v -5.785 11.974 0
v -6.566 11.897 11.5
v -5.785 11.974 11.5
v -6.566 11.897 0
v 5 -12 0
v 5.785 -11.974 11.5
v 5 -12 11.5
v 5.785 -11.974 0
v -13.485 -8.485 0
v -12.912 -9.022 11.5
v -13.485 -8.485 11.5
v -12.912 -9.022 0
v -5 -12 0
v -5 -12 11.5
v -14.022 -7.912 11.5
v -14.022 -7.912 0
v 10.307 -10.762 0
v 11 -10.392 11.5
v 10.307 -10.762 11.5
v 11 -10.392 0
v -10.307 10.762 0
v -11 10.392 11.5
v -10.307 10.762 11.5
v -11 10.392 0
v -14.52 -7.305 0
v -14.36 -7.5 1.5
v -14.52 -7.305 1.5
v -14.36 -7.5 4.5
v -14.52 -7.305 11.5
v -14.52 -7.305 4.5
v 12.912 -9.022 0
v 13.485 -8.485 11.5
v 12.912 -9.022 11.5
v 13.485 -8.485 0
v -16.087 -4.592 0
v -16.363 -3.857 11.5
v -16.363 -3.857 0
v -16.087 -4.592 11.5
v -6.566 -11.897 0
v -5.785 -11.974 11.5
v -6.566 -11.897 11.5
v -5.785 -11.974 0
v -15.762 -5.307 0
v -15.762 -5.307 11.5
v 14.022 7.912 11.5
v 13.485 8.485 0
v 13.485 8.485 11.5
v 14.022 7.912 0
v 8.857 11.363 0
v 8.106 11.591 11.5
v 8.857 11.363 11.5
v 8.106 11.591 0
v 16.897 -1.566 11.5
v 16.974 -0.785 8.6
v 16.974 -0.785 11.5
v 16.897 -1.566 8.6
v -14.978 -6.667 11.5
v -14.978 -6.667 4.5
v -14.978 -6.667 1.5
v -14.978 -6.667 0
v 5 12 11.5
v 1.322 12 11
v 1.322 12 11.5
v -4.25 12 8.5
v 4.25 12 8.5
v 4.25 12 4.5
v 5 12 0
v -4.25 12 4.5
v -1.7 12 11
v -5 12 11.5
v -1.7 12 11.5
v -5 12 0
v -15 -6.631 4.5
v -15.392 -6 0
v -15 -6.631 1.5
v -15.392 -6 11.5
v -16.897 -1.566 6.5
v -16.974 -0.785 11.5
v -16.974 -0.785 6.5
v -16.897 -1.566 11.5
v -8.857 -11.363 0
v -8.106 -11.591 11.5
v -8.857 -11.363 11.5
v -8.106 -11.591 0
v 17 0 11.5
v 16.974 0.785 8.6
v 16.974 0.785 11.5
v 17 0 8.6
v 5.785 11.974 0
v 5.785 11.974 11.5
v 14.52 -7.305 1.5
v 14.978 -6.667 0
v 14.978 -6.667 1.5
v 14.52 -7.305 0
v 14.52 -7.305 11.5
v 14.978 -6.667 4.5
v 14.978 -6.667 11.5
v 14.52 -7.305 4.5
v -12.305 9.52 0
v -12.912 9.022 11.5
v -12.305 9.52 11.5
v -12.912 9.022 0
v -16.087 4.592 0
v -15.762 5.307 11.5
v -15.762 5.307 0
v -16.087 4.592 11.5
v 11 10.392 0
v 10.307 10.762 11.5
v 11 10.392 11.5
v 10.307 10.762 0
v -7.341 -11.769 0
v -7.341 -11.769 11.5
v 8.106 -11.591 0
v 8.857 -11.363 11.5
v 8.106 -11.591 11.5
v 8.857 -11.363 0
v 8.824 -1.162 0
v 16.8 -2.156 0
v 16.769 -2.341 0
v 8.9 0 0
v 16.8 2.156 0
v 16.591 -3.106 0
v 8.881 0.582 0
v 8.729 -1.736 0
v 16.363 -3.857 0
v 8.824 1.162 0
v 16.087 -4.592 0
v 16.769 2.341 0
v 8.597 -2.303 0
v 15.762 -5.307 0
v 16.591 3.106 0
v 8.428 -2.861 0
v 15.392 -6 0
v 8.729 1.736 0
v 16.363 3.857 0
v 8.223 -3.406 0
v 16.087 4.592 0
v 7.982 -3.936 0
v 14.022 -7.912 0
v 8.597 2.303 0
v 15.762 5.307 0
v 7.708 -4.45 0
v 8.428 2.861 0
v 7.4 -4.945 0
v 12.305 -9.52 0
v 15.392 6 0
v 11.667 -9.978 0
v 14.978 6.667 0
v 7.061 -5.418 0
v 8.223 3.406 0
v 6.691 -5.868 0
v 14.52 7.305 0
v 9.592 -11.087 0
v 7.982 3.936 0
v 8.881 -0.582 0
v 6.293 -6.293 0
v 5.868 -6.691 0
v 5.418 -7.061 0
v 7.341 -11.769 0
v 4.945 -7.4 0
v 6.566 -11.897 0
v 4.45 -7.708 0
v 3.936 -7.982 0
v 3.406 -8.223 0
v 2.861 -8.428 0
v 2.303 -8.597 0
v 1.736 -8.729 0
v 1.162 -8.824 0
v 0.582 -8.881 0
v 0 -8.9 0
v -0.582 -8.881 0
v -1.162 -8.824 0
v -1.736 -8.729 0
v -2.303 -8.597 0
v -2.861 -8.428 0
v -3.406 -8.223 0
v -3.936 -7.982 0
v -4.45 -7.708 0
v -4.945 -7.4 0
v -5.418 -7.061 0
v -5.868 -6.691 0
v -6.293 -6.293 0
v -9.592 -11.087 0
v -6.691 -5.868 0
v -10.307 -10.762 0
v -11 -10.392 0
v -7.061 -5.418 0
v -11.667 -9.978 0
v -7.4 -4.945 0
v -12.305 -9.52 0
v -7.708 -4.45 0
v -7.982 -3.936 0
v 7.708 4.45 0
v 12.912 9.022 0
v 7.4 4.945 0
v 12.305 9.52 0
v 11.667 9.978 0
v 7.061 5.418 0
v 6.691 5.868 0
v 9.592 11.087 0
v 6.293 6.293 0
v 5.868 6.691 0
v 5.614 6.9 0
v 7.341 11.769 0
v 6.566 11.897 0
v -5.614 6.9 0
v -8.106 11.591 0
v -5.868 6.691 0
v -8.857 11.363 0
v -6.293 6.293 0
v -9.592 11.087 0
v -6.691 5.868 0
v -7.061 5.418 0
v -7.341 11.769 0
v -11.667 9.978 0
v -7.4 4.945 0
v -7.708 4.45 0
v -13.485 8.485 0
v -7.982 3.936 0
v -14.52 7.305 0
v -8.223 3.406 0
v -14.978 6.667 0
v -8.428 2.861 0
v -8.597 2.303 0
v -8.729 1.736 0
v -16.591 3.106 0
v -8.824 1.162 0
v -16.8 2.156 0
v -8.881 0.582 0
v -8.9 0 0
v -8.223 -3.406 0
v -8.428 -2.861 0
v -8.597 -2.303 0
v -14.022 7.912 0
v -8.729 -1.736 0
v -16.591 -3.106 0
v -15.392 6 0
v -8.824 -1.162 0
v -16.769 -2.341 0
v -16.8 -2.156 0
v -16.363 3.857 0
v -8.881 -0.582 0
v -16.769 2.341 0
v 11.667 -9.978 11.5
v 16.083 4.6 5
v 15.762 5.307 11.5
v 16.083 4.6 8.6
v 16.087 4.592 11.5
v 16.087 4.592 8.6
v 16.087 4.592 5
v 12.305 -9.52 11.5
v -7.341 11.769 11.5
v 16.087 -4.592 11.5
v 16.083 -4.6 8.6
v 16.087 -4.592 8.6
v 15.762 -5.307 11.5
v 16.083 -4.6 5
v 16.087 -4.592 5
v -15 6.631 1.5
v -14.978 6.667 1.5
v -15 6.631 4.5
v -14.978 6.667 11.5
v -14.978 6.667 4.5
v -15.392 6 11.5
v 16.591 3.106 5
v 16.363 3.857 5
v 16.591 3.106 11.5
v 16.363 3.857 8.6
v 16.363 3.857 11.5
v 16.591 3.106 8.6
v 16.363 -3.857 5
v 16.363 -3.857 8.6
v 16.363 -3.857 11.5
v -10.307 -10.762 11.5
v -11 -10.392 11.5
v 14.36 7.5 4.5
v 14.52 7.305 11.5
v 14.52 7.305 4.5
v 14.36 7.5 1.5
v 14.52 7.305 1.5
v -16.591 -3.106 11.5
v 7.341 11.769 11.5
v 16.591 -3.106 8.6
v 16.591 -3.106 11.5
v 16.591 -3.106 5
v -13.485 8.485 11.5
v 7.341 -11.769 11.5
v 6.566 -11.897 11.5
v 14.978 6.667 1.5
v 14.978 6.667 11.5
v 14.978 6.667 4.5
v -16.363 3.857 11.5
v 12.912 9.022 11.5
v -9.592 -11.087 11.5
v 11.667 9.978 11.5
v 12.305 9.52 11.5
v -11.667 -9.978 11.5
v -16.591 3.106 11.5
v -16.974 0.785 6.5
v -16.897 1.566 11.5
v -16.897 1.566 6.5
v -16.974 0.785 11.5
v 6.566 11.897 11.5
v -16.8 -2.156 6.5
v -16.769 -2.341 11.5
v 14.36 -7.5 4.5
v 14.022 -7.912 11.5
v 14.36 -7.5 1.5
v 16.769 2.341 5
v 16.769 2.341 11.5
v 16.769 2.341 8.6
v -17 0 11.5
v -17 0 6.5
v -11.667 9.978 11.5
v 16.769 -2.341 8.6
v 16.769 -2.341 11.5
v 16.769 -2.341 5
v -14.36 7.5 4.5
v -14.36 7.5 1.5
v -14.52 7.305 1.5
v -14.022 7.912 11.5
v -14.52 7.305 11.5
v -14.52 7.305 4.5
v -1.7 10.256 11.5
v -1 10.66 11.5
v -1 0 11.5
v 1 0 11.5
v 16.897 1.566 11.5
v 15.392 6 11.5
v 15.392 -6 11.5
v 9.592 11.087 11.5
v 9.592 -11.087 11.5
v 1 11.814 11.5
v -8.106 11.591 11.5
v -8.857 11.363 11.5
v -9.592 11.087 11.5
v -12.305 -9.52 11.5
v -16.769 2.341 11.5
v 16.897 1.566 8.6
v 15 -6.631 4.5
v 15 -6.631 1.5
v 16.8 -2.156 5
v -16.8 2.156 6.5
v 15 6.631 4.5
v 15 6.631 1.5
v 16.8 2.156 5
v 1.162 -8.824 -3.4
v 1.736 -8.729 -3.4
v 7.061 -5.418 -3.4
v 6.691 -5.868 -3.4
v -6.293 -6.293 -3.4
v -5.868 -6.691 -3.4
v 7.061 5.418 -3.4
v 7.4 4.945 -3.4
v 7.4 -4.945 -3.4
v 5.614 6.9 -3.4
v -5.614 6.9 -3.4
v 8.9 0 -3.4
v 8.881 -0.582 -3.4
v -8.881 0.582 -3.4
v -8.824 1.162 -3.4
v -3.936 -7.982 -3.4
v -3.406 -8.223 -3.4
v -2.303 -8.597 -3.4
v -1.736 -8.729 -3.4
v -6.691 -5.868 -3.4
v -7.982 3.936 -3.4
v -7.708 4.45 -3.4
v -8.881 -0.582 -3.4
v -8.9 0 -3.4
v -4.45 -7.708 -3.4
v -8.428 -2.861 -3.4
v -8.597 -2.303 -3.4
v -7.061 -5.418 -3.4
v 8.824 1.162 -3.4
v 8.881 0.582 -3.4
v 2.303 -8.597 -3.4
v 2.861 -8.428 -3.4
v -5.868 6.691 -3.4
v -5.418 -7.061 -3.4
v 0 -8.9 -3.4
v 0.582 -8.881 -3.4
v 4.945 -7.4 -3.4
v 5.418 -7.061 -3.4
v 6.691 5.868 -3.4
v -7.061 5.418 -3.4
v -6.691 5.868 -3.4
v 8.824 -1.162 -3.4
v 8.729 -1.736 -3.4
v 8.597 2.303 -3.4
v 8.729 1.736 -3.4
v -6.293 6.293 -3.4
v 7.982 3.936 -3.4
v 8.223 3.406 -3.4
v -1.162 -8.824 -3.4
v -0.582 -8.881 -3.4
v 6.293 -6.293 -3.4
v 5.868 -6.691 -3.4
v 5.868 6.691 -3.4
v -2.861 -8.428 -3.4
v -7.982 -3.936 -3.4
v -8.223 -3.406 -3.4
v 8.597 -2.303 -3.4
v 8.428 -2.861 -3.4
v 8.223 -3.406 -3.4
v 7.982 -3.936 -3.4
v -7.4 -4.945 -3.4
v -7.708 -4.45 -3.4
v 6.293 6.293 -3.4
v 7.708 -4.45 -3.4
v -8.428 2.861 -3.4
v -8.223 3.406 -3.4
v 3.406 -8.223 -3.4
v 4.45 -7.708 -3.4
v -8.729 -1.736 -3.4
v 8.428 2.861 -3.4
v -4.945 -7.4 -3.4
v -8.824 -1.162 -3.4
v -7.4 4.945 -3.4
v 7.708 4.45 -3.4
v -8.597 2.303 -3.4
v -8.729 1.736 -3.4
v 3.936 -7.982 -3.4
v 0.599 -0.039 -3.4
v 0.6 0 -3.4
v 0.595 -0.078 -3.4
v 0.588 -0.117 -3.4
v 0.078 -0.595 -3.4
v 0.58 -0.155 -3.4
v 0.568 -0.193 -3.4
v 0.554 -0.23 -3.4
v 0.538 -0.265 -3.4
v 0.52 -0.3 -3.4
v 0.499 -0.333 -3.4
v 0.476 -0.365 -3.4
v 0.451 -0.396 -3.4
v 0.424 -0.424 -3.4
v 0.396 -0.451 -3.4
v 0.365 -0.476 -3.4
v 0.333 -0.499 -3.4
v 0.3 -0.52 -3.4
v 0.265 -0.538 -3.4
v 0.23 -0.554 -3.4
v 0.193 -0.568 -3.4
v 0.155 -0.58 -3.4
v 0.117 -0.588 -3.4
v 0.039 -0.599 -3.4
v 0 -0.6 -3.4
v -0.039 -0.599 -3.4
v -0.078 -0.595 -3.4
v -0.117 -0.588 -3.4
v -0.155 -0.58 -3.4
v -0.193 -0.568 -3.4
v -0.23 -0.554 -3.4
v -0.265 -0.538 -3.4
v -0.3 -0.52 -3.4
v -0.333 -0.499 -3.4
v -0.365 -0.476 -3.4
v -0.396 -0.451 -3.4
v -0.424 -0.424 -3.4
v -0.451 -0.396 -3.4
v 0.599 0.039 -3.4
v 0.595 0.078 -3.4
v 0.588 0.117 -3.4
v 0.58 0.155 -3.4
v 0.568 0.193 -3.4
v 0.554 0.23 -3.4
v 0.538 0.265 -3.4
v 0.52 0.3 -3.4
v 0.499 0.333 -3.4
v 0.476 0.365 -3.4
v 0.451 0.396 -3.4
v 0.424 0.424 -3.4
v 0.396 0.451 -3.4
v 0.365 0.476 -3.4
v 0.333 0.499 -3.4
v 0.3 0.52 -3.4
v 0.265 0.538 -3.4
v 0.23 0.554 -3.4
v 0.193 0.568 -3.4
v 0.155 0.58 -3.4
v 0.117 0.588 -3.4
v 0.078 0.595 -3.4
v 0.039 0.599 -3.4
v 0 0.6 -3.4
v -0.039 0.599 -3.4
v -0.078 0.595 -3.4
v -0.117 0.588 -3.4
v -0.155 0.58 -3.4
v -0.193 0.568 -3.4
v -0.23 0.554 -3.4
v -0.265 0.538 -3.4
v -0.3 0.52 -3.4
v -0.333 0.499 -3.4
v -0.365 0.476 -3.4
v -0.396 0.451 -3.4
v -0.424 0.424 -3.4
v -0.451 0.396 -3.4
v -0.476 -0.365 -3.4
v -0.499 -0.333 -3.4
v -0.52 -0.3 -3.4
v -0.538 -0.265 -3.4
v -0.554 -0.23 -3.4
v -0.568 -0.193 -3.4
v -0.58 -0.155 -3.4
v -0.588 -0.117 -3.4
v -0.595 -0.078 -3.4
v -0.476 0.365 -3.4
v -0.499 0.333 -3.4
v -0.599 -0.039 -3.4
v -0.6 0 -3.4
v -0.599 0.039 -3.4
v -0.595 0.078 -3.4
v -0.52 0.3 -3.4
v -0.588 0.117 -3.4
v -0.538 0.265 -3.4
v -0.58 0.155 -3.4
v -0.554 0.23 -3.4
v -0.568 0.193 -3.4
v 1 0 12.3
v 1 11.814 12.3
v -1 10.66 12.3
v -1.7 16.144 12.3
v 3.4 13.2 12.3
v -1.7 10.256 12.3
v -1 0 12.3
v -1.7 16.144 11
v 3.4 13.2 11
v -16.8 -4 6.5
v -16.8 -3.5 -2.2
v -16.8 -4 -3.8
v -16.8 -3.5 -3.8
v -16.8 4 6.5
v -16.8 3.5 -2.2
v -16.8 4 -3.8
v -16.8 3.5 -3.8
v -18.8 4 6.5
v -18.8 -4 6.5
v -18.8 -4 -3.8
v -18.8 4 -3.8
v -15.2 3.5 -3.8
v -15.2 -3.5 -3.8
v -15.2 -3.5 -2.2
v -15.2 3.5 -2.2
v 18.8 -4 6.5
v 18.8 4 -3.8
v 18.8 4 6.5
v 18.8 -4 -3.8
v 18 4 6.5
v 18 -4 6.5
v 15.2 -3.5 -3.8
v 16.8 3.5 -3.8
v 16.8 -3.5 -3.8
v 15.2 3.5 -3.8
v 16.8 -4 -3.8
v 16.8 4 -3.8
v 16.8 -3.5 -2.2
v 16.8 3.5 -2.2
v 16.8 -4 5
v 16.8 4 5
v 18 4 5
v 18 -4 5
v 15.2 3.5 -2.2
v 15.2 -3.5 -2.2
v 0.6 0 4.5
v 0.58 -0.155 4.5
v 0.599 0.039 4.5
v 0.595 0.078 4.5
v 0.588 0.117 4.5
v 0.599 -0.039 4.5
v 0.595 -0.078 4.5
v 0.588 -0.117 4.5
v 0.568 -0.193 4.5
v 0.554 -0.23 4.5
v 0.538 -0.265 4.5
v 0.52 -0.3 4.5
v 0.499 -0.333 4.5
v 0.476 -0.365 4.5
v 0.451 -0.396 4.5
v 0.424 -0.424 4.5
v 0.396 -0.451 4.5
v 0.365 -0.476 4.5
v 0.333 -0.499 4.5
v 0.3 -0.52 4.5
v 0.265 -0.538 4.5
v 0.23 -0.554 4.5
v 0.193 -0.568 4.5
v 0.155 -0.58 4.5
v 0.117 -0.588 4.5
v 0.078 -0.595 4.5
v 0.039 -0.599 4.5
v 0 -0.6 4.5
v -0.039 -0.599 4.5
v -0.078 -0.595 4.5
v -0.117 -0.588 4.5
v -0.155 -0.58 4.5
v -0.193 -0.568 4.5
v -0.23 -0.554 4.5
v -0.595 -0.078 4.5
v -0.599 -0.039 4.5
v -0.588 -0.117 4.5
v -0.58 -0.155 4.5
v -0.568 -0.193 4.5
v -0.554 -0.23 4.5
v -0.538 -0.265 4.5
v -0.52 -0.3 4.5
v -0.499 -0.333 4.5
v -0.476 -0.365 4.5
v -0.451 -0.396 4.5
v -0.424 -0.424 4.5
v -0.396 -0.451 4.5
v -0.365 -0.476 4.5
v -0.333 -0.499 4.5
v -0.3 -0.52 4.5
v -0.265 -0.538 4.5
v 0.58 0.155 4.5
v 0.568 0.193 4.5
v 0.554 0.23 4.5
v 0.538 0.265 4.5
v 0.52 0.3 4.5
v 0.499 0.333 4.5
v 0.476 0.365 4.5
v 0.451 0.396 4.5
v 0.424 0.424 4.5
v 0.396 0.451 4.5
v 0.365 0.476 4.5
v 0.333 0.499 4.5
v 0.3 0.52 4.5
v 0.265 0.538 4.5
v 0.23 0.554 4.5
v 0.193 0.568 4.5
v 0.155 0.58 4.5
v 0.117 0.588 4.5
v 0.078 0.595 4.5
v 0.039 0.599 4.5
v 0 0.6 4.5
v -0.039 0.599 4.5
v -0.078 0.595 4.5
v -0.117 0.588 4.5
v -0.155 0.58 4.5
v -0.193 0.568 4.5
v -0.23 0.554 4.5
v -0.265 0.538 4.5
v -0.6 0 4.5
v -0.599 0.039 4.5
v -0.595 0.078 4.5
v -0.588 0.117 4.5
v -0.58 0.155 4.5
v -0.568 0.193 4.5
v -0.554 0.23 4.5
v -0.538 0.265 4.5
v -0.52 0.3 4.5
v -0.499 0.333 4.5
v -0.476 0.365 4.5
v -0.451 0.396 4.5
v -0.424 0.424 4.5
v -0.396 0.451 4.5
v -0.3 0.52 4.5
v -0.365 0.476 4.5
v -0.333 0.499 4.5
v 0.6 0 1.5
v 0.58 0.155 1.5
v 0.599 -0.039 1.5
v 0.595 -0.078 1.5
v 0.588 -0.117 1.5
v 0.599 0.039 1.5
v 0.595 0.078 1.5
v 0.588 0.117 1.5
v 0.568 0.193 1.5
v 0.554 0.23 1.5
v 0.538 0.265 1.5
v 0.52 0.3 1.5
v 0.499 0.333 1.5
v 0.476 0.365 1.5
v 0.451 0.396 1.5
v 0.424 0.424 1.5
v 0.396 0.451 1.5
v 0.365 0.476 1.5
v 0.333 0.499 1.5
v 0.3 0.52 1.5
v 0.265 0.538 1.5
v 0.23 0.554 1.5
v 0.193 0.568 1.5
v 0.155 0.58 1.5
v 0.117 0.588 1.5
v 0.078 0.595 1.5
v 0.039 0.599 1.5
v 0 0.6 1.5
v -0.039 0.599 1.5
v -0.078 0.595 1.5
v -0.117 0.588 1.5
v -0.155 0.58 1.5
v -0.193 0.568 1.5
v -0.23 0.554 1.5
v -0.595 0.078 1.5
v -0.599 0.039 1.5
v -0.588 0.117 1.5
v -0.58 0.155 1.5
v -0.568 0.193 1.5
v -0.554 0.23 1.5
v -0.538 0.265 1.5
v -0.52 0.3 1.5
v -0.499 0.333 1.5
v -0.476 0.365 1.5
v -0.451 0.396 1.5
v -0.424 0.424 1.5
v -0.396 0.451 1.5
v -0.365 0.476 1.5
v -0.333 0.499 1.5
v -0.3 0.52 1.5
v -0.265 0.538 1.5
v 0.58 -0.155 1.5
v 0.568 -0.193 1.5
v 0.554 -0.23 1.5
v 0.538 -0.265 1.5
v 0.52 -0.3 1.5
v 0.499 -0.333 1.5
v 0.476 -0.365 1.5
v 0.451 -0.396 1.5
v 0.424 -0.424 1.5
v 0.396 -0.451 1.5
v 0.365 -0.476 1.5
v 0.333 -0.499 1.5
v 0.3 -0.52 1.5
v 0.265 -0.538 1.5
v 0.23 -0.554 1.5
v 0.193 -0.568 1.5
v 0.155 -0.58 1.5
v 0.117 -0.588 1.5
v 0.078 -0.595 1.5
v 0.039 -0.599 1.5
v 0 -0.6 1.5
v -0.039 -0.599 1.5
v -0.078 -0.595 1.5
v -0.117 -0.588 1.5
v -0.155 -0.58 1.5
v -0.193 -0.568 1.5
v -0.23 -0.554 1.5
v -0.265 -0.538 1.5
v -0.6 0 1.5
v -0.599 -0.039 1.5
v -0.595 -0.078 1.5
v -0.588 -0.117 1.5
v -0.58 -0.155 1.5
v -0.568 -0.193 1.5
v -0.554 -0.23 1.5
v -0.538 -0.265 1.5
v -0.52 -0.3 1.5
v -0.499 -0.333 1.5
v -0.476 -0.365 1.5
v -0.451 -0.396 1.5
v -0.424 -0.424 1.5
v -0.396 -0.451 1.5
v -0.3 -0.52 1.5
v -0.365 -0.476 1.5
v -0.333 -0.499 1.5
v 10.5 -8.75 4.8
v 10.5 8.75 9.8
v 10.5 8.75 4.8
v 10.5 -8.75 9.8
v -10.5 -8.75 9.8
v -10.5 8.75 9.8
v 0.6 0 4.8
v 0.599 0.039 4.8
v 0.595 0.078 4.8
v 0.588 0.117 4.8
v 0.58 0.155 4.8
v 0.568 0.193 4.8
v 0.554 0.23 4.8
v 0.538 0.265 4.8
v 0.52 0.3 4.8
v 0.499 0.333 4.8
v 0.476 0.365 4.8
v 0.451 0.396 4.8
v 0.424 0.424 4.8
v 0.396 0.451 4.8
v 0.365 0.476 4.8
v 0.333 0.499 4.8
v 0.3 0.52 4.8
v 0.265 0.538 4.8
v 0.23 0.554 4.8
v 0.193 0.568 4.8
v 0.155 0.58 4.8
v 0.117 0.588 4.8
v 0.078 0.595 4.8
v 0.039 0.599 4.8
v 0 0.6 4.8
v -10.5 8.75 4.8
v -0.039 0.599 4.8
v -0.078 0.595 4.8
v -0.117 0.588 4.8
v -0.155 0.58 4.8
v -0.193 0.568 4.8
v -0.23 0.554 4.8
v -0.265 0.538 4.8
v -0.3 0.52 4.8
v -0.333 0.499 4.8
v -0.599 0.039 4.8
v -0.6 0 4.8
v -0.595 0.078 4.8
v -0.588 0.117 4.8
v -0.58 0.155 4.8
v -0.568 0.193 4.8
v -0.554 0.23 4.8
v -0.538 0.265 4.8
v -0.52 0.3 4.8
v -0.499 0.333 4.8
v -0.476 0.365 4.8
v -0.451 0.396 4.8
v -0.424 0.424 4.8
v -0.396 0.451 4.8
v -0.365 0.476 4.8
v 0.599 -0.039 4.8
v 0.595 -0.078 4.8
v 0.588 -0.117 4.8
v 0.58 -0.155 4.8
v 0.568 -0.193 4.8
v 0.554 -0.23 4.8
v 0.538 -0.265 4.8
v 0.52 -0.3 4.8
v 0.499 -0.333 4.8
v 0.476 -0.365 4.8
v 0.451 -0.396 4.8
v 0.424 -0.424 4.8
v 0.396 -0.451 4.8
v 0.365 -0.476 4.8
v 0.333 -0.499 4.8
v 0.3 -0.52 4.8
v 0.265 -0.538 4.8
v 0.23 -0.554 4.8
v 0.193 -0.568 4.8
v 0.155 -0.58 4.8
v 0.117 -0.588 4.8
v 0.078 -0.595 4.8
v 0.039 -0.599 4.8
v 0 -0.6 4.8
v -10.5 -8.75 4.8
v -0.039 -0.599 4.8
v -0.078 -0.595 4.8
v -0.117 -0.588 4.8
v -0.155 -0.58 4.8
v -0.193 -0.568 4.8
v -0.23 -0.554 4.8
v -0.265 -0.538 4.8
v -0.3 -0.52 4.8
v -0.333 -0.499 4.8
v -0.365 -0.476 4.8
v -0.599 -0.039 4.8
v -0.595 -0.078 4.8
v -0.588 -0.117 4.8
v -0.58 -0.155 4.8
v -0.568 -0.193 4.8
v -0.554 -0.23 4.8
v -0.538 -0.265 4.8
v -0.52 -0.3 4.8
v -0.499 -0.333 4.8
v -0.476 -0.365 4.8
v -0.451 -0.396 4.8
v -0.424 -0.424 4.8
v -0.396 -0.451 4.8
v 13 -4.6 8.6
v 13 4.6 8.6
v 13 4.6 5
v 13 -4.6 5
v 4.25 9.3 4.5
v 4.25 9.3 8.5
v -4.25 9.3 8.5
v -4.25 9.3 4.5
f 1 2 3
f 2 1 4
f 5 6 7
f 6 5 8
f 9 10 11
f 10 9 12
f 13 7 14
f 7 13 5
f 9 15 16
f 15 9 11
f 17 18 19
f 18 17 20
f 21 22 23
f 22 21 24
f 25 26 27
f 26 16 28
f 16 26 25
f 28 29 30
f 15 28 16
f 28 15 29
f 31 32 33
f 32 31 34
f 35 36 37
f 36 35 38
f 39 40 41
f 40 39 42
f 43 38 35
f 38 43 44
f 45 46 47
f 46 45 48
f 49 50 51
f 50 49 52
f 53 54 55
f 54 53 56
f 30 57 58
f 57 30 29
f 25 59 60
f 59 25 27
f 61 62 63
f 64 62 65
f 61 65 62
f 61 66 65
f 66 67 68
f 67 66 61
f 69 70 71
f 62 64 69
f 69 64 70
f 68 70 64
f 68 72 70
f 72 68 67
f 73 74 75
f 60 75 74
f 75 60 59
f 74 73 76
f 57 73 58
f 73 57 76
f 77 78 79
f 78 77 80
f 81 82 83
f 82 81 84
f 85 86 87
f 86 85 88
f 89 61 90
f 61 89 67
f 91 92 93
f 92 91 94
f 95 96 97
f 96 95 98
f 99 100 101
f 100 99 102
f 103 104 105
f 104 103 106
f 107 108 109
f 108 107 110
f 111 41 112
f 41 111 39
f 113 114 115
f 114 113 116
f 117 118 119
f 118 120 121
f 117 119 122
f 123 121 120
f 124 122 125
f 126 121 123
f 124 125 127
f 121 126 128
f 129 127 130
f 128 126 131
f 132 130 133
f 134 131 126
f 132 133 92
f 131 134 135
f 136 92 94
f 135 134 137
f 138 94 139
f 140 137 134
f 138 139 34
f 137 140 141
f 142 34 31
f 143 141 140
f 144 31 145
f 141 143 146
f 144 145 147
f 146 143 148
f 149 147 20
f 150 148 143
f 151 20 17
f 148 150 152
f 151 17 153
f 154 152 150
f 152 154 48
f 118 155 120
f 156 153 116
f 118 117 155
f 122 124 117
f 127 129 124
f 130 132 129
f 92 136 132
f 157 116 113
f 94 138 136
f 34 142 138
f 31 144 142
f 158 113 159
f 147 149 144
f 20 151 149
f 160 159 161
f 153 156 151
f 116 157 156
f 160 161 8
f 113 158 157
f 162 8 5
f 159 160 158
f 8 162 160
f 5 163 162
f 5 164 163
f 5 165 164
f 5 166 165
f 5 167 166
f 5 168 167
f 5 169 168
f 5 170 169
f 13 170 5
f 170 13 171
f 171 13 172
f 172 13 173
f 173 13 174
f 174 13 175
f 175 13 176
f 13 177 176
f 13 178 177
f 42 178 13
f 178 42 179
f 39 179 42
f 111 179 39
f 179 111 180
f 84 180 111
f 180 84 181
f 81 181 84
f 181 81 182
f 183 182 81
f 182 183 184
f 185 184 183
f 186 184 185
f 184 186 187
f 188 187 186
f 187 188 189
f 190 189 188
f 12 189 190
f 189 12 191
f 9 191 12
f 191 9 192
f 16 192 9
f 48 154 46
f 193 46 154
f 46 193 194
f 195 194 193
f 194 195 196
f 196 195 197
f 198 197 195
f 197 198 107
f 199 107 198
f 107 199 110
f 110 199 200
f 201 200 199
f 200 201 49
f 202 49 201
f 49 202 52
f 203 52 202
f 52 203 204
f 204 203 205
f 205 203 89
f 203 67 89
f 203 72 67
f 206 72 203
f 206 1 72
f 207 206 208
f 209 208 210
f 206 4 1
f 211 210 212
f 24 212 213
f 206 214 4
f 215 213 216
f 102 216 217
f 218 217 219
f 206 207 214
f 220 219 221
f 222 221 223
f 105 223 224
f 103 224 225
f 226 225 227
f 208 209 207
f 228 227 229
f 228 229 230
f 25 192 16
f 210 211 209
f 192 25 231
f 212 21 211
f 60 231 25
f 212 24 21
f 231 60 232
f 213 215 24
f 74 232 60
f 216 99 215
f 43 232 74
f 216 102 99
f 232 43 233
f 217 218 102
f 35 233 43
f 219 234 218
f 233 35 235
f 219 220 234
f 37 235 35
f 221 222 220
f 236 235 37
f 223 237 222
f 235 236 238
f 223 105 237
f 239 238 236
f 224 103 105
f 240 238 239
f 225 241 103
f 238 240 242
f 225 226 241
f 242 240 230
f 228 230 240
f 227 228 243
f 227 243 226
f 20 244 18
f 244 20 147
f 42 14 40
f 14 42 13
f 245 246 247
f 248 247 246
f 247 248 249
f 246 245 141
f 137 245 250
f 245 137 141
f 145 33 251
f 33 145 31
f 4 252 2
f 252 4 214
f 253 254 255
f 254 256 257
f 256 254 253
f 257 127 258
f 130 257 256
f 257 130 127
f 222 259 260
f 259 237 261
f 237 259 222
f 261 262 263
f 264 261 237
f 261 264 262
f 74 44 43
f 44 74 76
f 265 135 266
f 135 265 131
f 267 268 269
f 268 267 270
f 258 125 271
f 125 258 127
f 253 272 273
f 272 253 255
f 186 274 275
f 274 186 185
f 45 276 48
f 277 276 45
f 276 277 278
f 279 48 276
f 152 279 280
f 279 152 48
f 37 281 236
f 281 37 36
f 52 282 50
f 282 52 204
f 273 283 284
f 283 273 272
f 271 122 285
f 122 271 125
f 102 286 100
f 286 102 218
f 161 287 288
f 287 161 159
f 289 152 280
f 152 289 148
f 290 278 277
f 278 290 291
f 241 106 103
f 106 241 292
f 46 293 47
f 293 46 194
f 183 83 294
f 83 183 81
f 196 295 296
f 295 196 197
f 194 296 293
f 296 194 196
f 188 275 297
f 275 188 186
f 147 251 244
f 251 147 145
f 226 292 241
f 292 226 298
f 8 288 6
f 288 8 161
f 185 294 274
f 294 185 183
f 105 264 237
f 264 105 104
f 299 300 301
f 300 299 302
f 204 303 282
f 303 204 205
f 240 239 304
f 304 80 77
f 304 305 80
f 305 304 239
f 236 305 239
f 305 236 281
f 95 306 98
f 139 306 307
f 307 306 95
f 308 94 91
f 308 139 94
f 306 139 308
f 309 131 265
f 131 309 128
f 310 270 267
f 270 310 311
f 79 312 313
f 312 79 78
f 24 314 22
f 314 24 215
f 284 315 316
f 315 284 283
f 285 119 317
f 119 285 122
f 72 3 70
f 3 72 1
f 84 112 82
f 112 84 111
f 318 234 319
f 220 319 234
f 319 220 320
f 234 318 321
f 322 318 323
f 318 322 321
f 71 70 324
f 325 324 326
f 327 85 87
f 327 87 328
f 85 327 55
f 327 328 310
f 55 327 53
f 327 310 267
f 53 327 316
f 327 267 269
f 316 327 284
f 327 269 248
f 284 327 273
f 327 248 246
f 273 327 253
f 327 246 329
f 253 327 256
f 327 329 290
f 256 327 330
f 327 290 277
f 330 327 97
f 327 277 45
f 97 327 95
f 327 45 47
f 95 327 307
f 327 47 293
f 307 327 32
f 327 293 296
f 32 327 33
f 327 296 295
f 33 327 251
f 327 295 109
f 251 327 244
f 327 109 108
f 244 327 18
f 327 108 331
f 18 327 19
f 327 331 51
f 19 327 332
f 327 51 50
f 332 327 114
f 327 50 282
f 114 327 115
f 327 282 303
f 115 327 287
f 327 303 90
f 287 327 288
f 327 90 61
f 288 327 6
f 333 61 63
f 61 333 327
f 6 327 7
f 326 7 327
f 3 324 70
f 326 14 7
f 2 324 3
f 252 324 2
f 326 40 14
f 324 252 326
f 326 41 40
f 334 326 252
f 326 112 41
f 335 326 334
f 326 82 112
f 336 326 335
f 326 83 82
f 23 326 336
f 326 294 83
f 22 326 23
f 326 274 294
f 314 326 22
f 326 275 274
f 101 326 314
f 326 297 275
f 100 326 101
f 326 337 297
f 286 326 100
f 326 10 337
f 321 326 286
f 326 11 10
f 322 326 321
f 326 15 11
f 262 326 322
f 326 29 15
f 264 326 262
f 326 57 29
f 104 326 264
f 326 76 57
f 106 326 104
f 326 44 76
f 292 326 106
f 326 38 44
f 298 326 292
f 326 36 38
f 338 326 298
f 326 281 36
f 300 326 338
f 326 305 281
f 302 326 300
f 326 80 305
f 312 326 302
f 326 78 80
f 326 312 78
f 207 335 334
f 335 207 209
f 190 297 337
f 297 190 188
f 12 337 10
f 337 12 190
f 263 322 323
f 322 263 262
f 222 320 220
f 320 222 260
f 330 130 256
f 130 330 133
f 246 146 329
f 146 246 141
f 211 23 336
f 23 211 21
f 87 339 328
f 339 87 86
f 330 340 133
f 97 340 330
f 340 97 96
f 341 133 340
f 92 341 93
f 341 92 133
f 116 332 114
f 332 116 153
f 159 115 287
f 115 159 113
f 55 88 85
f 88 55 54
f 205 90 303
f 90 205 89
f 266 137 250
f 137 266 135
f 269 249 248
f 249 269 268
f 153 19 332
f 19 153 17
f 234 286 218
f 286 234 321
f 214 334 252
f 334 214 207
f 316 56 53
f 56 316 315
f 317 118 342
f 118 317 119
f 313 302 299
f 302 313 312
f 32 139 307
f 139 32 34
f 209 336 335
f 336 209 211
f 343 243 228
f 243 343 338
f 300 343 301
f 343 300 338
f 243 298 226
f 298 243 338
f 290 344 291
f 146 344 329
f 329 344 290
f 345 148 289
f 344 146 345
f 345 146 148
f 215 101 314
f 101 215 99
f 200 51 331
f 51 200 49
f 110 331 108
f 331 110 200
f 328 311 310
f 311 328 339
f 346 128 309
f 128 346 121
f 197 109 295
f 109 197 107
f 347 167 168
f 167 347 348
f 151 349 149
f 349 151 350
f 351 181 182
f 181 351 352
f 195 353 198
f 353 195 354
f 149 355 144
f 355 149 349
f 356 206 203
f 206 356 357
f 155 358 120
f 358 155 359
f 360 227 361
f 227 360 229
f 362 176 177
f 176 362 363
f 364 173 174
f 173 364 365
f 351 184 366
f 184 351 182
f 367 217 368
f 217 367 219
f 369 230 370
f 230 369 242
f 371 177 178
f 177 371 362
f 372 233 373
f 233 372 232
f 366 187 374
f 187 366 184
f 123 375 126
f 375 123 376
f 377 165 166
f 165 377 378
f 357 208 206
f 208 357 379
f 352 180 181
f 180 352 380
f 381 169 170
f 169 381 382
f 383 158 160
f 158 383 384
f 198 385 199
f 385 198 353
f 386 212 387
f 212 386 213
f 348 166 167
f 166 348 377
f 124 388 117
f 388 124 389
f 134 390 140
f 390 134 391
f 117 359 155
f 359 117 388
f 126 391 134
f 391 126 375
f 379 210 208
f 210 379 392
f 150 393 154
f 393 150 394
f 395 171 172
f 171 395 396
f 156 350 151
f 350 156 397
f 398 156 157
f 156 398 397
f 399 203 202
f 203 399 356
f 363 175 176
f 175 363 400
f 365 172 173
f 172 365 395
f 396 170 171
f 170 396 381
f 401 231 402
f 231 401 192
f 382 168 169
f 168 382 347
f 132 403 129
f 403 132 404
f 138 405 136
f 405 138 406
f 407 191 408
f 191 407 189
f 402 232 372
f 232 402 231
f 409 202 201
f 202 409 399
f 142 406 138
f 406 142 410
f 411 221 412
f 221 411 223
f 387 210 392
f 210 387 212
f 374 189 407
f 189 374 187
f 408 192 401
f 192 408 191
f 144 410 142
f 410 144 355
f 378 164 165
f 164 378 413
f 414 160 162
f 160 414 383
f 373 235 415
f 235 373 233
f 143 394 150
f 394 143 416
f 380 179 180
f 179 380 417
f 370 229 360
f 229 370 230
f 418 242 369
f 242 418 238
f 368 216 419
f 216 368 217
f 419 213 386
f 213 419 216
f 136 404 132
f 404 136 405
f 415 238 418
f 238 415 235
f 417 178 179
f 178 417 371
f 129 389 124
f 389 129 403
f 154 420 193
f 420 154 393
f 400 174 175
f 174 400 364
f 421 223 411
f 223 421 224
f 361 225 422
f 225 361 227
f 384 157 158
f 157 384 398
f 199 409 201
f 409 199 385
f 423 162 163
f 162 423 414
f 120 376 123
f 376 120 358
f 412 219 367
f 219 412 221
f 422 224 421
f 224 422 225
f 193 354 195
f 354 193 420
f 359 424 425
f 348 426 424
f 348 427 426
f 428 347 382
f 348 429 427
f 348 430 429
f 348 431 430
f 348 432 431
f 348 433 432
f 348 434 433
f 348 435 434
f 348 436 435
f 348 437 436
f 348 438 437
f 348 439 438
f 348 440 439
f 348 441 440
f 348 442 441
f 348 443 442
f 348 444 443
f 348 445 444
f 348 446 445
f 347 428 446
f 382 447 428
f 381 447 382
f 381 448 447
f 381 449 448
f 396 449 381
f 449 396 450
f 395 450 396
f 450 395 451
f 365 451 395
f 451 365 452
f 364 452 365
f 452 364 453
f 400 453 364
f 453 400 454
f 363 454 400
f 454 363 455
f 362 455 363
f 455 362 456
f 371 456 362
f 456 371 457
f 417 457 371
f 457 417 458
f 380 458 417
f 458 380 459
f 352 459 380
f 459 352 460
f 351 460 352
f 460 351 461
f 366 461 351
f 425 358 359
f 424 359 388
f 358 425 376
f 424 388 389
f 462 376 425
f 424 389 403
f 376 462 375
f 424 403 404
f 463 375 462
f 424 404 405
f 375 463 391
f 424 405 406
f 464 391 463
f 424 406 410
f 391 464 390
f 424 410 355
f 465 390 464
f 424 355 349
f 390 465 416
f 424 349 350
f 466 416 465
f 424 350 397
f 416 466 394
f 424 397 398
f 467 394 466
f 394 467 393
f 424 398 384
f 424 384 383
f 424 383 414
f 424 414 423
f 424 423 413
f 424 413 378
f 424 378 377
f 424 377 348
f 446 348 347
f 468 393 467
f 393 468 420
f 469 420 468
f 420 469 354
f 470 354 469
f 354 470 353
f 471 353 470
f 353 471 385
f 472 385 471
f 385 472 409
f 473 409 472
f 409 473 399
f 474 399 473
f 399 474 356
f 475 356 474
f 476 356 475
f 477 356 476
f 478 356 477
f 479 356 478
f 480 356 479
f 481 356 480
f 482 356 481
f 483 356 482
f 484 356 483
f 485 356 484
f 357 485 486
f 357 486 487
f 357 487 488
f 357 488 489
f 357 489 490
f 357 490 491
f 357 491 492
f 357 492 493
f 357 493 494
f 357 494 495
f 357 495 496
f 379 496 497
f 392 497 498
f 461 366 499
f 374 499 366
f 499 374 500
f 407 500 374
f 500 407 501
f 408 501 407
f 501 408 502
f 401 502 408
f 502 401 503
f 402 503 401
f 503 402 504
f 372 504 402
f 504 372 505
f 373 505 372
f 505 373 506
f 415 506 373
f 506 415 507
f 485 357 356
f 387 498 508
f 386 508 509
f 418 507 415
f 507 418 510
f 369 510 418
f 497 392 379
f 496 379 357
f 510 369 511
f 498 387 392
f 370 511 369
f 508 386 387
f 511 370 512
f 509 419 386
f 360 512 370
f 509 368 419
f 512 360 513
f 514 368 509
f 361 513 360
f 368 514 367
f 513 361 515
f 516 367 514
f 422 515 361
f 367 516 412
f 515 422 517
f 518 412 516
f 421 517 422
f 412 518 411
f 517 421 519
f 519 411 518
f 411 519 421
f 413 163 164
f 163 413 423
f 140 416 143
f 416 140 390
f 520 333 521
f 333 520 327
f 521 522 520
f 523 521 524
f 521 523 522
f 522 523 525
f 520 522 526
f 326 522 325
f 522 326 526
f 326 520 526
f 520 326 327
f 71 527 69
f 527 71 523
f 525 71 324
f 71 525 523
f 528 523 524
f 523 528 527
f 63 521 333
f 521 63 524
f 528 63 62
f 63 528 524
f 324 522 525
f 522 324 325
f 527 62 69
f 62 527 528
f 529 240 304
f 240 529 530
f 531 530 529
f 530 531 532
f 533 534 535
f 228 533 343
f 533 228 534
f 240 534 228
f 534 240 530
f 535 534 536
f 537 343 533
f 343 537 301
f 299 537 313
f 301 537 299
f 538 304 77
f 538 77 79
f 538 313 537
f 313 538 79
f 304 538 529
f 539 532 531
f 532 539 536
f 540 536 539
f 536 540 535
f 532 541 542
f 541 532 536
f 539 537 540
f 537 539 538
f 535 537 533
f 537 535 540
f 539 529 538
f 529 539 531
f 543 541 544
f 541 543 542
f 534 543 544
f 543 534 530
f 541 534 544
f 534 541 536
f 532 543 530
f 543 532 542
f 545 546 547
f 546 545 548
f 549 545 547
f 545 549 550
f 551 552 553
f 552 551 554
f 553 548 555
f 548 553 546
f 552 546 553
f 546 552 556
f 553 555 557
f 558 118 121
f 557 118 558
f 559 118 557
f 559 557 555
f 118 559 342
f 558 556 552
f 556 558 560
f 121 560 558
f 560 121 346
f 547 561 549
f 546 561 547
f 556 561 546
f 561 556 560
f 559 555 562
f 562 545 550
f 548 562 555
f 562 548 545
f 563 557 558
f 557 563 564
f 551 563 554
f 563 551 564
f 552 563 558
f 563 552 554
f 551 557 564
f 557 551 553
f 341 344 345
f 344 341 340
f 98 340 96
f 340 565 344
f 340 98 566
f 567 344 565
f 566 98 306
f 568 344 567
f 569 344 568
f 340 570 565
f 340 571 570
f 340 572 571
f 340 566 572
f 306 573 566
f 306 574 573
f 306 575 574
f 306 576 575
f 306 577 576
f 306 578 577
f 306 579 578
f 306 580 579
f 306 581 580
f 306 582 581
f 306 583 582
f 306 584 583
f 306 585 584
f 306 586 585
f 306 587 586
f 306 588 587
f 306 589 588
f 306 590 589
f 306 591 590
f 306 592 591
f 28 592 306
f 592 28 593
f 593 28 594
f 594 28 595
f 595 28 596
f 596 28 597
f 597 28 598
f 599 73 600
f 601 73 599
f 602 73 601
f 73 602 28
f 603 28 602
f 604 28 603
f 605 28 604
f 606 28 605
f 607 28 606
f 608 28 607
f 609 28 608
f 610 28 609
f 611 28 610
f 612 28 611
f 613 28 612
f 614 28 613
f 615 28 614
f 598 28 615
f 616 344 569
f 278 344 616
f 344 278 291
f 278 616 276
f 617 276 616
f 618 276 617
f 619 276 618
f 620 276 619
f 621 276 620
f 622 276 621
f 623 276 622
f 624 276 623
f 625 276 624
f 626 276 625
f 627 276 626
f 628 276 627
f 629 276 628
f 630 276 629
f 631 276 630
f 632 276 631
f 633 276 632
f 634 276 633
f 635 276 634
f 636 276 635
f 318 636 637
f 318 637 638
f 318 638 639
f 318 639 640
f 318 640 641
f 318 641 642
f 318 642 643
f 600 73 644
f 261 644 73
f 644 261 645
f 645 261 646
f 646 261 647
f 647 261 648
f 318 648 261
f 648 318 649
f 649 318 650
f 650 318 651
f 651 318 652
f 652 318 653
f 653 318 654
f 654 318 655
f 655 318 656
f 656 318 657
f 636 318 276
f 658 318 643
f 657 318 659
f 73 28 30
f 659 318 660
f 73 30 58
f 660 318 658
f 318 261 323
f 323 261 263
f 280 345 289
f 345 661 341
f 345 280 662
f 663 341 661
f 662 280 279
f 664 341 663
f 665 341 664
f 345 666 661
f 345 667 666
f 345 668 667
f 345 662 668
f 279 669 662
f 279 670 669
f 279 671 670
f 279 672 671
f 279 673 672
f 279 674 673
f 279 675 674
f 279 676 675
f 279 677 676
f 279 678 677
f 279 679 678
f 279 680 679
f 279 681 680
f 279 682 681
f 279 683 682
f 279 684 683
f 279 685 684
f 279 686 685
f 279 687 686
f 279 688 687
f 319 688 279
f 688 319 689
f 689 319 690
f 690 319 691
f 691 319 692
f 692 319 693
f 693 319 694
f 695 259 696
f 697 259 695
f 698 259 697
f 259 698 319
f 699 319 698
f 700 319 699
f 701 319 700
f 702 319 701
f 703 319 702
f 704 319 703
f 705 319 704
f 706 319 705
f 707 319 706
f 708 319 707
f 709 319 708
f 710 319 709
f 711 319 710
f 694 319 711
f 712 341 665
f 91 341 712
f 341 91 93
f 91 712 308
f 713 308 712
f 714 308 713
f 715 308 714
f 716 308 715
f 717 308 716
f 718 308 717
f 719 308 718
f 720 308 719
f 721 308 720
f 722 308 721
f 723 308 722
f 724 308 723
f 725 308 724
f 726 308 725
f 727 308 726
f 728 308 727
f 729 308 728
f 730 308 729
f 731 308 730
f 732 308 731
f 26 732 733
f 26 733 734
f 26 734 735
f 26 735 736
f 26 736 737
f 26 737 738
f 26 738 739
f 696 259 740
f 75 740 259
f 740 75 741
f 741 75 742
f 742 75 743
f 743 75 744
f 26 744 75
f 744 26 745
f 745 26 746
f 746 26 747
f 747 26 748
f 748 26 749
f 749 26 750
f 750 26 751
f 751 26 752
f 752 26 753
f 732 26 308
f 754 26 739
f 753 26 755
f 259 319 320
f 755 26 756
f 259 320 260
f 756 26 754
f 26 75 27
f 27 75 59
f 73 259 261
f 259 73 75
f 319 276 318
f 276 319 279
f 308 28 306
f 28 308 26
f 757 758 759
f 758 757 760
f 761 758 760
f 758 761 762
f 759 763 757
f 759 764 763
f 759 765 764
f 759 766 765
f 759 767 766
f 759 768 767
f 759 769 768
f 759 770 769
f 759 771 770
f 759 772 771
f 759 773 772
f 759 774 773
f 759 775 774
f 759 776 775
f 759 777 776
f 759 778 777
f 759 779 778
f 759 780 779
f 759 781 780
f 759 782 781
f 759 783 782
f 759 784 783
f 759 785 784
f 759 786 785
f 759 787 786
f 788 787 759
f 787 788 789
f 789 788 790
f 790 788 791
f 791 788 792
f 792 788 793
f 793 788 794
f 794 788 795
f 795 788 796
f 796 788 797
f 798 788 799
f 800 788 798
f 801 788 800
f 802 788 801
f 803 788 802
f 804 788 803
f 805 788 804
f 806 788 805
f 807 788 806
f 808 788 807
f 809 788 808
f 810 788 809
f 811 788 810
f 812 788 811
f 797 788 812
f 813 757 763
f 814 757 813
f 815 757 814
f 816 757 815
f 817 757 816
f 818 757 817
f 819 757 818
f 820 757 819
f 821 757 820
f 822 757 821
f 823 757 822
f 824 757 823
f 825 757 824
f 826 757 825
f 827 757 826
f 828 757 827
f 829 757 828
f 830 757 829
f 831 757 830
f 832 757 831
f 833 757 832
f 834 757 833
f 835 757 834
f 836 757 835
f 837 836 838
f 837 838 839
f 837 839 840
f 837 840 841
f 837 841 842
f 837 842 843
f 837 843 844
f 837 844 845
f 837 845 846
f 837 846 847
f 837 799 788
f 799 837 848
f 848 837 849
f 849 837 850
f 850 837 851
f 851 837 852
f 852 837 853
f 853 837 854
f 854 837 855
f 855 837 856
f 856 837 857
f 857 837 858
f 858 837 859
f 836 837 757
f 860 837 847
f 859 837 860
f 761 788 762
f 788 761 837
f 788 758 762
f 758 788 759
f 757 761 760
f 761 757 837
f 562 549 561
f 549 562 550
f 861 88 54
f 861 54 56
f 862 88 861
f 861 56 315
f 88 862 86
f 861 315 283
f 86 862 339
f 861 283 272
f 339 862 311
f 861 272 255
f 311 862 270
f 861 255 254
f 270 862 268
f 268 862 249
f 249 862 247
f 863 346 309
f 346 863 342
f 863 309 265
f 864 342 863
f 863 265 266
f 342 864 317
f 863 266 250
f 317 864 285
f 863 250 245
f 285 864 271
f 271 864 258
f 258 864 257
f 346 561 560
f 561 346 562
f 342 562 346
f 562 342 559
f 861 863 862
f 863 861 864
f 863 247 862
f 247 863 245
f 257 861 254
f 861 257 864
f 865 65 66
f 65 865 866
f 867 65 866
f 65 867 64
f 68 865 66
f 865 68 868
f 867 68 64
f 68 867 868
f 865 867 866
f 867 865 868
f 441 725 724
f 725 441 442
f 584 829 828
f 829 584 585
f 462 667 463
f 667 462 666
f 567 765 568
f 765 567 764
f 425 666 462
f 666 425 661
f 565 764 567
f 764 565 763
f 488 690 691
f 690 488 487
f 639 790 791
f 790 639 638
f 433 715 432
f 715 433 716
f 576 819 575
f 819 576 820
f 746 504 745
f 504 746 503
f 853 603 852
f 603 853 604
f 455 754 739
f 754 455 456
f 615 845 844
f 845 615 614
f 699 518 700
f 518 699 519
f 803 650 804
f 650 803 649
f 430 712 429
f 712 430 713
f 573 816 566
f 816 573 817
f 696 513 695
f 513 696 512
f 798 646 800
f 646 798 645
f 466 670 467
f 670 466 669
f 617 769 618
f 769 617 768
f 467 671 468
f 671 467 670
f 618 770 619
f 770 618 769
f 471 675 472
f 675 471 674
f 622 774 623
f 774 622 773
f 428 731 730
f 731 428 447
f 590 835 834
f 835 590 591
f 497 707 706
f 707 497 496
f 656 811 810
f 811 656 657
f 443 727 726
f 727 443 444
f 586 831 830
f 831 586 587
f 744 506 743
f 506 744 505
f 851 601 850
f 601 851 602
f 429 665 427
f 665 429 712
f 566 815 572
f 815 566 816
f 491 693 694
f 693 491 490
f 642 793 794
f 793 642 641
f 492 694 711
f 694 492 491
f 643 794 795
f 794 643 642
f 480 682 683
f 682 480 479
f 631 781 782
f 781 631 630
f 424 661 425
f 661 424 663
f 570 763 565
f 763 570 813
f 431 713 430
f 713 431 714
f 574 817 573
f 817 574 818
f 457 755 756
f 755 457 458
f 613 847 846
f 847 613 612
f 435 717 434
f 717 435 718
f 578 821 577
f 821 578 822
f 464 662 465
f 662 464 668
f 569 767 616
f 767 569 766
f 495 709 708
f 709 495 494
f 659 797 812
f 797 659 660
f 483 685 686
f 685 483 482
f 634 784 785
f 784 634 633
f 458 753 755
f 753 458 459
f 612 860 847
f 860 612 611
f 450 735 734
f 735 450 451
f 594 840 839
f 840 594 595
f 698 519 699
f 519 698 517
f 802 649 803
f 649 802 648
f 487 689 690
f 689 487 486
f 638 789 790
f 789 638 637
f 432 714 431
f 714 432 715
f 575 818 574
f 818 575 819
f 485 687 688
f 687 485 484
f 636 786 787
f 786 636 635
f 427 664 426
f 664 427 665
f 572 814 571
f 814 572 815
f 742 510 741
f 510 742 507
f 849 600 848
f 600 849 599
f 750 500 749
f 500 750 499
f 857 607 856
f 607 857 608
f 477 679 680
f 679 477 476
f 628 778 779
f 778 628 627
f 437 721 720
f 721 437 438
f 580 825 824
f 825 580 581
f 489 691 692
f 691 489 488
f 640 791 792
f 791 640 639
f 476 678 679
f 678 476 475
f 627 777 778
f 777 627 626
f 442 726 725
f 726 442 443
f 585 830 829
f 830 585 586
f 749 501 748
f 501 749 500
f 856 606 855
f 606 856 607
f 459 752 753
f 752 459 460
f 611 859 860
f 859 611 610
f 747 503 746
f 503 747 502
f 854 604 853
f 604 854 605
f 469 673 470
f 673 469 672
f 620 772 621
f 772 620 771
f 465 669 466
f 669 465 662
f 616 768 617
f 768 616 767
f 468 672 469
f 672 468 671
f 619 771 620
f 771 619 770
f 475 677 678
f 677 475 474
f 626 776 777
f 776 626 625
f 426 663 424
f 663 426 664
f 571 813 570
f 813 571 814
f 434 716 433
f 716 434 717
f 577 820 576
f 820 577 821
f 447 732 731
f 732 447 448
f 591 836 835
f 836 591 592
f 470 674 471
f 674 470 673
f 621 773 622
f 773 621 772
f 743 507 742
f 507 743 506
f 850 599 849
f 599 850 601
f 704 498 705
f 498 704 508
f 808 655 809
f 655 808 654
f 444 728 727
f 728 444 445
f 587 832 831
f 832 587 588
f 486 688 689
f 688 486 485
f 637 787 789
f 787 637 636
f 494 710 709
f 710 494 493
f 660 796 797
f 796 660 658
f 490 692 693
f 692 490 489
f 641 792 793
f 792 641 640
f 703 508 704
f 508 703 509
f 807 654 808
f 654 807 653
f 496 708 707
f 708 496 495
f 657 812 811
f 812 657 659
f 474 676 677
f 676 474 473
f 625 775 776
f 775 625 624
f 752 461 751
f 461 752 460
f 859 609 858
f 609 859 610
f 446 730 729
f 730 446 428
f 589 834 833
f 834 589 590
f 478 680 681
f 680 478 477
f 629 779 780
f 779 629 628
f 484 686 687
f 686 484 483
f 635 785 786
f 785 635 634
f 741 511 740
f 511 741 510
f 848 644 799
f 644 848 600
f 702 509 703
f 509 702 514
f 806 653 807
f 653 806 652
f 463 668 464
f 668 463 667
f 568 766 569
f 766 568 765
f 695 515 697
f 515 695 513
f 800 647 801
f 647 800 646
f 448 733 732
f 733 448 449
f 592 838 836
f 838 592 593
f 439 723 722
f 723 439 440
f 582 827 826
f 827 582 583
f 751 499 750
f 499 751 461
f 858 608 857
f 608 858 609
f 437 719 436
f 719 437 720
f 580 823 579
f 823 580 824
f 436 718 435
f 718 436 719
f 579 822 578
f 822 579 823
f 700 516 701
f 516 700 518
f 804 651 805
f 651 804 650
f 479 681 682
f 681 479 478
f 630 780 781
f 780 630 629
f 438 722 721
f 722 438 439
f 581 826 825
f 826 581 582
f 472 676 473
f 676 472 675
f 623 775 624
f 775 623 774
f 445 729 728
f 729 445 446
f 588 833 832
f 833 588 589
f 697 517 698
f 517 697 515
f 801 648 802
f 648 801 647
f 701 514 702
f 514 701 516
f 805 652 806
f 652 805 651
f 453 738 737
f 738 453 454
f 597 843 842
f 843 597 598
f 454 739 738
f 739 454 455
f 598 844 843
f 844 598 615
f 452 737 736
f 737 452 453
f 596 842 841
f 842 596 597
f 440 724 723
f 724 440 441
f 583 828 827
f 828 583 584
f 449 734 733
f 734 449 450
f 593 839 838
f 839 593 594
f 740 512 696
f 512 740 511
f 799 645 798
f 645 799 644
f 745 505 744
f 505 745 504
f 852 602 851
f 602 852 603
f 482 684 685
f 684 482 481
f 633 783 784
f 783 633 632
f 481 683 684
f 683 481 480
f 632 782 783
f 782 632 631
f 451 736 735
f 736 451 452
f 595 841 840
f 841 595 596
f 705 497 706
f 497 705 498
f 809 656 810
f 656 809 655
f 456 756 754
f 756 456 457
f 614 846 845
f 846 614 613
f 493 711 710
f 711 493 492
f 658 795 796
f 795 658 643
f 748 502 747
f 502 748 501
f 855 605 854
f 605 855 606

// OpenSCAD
// Kinetra — Parametric 3D CAD Model: GeoTrick Sensor Pod Housing (Seeed XIAO BLE nRF52840 Sense + LiPo L301525 + ESP101)
// Specification: specs/01-hardware-imu-shaft.md §1.3.B

$fn = 96;

// --- Exact Component Dimensions from User BOM (mm) ---
xiao_length_mm          = 21.0;  // Seeed XIAO BLE nRF52840 Sense (102010469)
xiao_width_mm           = 17.5;
xiao_thickness_mm       = 3.5;

lipo_length_mm          = 30.0;  // Accu LiPo 3.7V 85mAh L301525 (09958)
lipo_width_mm           = 15.0;
lipo_thickness_mm       = 2.5;
vhb_cushion_mm          = 0.5;   // 3M VHB vibration-damping cushion under LiPo

esp101_length_mm        = 8.5;   // Miniature slide switch ESP101 (07179)
esp101_width_mm         = 3.5;
esp101_recess_depth_mm  = 1.2;   // Flush guard recess preventing accidental switch-off during swing

pod_outer_length_mm     = 34.0;
pod_outer_width_mm      = 24.0;
pod_total_height_mm     = 11.5;

d_plug_diameter_mm      = 17.8;  // Male D-plug with 0.2mm clearance for the 18.0mm mount socket
d_plug_flat_offset_mm   = 6.9;
d_plug_height_mm        = 3.4;

pdm_acoustic_port_d_mm  = 1.2;   // Structure-borne acoustic channel to MP34DT05-A PDM microphone

module d_plug_2d(diam, flat_offset) {
    intersection() {
        circle(d = diam);
        translate([-diam/2, -diam/2])
            square([diam, diam/2 + flat_offset]);
    }
}

module rounded_pill_box(length, width, height) {
    hull() {
        translate([-(length - width)/2, 0, 0]) cylinder(d = width, h = height);
        translate([+(length - width)/2, 0, 0]) cylinder(d = width, h = height);
    }
}

module geotrick_sensor_pod_housing() {
    difference() {
        union() {
            // 1. Main low-profile aerodynamic shell
            rounded_pill_box(pod_outer_length_mm, pod_outer_width_mm, pod_total_height_mm);
            // 2. Bottom male D-keyed plug with 5-pin magnetic pogo connector boss
            translate([0, 0, -d_plug_height_mm])
                linear_extrude(height = d_plug_height_mm)
                    d_plug_2d(d_plug_diameter_mm, d_plug_flat_offset_mm);
            // 3. Prominent 3D raised '▲ FACE' alignment sight rib & arrow on top cap (+Y)
            translate([-1.0, 0, pod_total_height_mm])
                cube([2.0, pod_outer_width_mm/2, 0.8]);
            translate([0, pod_outer_width_mm/2 + 1.2, pod_total_height_mm - 0.5])
                cylinder(d = 6.8, h = 1.3, $fn = 3);
            // 4. Two resilient lateral Snap-Fit locking arms (-X and +X) with inward hooks and top finger release tabs
            translate([-pod_outer_length_mm/2 - 1.8, -4.0, -3.8])
                cube([2.0, 8.0, 10.3]);
            translate([-pod_outer_length_mm/2 + 0.2, -3.5, -3.8])
                cube([1.6, 7.0, 1.6]); // Left inward snap hook
            translate([+pod_outer_length_mm/2 - 0.2, -4.0, -3.8])
                cube([2.0, 8.0, 10.3]);
            translate([+pod_outer_length_mm/2 - 1.8, -3.5, -3.8])
                cube([1.6, 7.0, 1.6]); // Right inward snap hook
        }

        // 3. Lower cradle for L301525 LiPo battery (30 x 15 x 2.5 mm + 0.5mm VHB cushion)
        translate([-lipo_length_mm/2, -lipo_width_mm/2, 1.5])
            cube([lipo_length_mm, lipo_width_mm, lipo_thickness_mm + vhb_cushion_mm]);

        // 4. Rigid upper bay for Seeed XIAO BLE nRF52840 Sense (21 x 17.5 mm)
        translate([-xiao_length_mm/2, -xiao_width_mm/2, 4.8])
            cube([xiao_length_mm, xiao_width_mm, xiao_thickness_mm + 1.5]);

        // 5. USB-C charging port access window
        translate([pod_outer_length_mm/2 - 4.0, -4.6, 5.0])
            cube([5.0, 9.2, 3.6]);

        // 6. Recessed ESP101 master switch guard (1.2mm flush guard)
        translate([-esp101_length_mm/2, pod_outer_width_mm/2 - esp101_recess_depth_mm - 1.5, 4.5])
            cube([esp101_length_mm, esp101_width_mm, 4.0]);

        // 7. Ø1.2mm acoustic waveguide from bottom D-plug to onboard MP34DT05-A PDM microphone
        translate([0, 0, -d_plug_height_mm - 0.1])
            cylinder(d = pdm_acoustic_port_d_mm, h = d_plug_height_mm + 6.0);
    }
}

geotrick_sensor_pod_housing();
